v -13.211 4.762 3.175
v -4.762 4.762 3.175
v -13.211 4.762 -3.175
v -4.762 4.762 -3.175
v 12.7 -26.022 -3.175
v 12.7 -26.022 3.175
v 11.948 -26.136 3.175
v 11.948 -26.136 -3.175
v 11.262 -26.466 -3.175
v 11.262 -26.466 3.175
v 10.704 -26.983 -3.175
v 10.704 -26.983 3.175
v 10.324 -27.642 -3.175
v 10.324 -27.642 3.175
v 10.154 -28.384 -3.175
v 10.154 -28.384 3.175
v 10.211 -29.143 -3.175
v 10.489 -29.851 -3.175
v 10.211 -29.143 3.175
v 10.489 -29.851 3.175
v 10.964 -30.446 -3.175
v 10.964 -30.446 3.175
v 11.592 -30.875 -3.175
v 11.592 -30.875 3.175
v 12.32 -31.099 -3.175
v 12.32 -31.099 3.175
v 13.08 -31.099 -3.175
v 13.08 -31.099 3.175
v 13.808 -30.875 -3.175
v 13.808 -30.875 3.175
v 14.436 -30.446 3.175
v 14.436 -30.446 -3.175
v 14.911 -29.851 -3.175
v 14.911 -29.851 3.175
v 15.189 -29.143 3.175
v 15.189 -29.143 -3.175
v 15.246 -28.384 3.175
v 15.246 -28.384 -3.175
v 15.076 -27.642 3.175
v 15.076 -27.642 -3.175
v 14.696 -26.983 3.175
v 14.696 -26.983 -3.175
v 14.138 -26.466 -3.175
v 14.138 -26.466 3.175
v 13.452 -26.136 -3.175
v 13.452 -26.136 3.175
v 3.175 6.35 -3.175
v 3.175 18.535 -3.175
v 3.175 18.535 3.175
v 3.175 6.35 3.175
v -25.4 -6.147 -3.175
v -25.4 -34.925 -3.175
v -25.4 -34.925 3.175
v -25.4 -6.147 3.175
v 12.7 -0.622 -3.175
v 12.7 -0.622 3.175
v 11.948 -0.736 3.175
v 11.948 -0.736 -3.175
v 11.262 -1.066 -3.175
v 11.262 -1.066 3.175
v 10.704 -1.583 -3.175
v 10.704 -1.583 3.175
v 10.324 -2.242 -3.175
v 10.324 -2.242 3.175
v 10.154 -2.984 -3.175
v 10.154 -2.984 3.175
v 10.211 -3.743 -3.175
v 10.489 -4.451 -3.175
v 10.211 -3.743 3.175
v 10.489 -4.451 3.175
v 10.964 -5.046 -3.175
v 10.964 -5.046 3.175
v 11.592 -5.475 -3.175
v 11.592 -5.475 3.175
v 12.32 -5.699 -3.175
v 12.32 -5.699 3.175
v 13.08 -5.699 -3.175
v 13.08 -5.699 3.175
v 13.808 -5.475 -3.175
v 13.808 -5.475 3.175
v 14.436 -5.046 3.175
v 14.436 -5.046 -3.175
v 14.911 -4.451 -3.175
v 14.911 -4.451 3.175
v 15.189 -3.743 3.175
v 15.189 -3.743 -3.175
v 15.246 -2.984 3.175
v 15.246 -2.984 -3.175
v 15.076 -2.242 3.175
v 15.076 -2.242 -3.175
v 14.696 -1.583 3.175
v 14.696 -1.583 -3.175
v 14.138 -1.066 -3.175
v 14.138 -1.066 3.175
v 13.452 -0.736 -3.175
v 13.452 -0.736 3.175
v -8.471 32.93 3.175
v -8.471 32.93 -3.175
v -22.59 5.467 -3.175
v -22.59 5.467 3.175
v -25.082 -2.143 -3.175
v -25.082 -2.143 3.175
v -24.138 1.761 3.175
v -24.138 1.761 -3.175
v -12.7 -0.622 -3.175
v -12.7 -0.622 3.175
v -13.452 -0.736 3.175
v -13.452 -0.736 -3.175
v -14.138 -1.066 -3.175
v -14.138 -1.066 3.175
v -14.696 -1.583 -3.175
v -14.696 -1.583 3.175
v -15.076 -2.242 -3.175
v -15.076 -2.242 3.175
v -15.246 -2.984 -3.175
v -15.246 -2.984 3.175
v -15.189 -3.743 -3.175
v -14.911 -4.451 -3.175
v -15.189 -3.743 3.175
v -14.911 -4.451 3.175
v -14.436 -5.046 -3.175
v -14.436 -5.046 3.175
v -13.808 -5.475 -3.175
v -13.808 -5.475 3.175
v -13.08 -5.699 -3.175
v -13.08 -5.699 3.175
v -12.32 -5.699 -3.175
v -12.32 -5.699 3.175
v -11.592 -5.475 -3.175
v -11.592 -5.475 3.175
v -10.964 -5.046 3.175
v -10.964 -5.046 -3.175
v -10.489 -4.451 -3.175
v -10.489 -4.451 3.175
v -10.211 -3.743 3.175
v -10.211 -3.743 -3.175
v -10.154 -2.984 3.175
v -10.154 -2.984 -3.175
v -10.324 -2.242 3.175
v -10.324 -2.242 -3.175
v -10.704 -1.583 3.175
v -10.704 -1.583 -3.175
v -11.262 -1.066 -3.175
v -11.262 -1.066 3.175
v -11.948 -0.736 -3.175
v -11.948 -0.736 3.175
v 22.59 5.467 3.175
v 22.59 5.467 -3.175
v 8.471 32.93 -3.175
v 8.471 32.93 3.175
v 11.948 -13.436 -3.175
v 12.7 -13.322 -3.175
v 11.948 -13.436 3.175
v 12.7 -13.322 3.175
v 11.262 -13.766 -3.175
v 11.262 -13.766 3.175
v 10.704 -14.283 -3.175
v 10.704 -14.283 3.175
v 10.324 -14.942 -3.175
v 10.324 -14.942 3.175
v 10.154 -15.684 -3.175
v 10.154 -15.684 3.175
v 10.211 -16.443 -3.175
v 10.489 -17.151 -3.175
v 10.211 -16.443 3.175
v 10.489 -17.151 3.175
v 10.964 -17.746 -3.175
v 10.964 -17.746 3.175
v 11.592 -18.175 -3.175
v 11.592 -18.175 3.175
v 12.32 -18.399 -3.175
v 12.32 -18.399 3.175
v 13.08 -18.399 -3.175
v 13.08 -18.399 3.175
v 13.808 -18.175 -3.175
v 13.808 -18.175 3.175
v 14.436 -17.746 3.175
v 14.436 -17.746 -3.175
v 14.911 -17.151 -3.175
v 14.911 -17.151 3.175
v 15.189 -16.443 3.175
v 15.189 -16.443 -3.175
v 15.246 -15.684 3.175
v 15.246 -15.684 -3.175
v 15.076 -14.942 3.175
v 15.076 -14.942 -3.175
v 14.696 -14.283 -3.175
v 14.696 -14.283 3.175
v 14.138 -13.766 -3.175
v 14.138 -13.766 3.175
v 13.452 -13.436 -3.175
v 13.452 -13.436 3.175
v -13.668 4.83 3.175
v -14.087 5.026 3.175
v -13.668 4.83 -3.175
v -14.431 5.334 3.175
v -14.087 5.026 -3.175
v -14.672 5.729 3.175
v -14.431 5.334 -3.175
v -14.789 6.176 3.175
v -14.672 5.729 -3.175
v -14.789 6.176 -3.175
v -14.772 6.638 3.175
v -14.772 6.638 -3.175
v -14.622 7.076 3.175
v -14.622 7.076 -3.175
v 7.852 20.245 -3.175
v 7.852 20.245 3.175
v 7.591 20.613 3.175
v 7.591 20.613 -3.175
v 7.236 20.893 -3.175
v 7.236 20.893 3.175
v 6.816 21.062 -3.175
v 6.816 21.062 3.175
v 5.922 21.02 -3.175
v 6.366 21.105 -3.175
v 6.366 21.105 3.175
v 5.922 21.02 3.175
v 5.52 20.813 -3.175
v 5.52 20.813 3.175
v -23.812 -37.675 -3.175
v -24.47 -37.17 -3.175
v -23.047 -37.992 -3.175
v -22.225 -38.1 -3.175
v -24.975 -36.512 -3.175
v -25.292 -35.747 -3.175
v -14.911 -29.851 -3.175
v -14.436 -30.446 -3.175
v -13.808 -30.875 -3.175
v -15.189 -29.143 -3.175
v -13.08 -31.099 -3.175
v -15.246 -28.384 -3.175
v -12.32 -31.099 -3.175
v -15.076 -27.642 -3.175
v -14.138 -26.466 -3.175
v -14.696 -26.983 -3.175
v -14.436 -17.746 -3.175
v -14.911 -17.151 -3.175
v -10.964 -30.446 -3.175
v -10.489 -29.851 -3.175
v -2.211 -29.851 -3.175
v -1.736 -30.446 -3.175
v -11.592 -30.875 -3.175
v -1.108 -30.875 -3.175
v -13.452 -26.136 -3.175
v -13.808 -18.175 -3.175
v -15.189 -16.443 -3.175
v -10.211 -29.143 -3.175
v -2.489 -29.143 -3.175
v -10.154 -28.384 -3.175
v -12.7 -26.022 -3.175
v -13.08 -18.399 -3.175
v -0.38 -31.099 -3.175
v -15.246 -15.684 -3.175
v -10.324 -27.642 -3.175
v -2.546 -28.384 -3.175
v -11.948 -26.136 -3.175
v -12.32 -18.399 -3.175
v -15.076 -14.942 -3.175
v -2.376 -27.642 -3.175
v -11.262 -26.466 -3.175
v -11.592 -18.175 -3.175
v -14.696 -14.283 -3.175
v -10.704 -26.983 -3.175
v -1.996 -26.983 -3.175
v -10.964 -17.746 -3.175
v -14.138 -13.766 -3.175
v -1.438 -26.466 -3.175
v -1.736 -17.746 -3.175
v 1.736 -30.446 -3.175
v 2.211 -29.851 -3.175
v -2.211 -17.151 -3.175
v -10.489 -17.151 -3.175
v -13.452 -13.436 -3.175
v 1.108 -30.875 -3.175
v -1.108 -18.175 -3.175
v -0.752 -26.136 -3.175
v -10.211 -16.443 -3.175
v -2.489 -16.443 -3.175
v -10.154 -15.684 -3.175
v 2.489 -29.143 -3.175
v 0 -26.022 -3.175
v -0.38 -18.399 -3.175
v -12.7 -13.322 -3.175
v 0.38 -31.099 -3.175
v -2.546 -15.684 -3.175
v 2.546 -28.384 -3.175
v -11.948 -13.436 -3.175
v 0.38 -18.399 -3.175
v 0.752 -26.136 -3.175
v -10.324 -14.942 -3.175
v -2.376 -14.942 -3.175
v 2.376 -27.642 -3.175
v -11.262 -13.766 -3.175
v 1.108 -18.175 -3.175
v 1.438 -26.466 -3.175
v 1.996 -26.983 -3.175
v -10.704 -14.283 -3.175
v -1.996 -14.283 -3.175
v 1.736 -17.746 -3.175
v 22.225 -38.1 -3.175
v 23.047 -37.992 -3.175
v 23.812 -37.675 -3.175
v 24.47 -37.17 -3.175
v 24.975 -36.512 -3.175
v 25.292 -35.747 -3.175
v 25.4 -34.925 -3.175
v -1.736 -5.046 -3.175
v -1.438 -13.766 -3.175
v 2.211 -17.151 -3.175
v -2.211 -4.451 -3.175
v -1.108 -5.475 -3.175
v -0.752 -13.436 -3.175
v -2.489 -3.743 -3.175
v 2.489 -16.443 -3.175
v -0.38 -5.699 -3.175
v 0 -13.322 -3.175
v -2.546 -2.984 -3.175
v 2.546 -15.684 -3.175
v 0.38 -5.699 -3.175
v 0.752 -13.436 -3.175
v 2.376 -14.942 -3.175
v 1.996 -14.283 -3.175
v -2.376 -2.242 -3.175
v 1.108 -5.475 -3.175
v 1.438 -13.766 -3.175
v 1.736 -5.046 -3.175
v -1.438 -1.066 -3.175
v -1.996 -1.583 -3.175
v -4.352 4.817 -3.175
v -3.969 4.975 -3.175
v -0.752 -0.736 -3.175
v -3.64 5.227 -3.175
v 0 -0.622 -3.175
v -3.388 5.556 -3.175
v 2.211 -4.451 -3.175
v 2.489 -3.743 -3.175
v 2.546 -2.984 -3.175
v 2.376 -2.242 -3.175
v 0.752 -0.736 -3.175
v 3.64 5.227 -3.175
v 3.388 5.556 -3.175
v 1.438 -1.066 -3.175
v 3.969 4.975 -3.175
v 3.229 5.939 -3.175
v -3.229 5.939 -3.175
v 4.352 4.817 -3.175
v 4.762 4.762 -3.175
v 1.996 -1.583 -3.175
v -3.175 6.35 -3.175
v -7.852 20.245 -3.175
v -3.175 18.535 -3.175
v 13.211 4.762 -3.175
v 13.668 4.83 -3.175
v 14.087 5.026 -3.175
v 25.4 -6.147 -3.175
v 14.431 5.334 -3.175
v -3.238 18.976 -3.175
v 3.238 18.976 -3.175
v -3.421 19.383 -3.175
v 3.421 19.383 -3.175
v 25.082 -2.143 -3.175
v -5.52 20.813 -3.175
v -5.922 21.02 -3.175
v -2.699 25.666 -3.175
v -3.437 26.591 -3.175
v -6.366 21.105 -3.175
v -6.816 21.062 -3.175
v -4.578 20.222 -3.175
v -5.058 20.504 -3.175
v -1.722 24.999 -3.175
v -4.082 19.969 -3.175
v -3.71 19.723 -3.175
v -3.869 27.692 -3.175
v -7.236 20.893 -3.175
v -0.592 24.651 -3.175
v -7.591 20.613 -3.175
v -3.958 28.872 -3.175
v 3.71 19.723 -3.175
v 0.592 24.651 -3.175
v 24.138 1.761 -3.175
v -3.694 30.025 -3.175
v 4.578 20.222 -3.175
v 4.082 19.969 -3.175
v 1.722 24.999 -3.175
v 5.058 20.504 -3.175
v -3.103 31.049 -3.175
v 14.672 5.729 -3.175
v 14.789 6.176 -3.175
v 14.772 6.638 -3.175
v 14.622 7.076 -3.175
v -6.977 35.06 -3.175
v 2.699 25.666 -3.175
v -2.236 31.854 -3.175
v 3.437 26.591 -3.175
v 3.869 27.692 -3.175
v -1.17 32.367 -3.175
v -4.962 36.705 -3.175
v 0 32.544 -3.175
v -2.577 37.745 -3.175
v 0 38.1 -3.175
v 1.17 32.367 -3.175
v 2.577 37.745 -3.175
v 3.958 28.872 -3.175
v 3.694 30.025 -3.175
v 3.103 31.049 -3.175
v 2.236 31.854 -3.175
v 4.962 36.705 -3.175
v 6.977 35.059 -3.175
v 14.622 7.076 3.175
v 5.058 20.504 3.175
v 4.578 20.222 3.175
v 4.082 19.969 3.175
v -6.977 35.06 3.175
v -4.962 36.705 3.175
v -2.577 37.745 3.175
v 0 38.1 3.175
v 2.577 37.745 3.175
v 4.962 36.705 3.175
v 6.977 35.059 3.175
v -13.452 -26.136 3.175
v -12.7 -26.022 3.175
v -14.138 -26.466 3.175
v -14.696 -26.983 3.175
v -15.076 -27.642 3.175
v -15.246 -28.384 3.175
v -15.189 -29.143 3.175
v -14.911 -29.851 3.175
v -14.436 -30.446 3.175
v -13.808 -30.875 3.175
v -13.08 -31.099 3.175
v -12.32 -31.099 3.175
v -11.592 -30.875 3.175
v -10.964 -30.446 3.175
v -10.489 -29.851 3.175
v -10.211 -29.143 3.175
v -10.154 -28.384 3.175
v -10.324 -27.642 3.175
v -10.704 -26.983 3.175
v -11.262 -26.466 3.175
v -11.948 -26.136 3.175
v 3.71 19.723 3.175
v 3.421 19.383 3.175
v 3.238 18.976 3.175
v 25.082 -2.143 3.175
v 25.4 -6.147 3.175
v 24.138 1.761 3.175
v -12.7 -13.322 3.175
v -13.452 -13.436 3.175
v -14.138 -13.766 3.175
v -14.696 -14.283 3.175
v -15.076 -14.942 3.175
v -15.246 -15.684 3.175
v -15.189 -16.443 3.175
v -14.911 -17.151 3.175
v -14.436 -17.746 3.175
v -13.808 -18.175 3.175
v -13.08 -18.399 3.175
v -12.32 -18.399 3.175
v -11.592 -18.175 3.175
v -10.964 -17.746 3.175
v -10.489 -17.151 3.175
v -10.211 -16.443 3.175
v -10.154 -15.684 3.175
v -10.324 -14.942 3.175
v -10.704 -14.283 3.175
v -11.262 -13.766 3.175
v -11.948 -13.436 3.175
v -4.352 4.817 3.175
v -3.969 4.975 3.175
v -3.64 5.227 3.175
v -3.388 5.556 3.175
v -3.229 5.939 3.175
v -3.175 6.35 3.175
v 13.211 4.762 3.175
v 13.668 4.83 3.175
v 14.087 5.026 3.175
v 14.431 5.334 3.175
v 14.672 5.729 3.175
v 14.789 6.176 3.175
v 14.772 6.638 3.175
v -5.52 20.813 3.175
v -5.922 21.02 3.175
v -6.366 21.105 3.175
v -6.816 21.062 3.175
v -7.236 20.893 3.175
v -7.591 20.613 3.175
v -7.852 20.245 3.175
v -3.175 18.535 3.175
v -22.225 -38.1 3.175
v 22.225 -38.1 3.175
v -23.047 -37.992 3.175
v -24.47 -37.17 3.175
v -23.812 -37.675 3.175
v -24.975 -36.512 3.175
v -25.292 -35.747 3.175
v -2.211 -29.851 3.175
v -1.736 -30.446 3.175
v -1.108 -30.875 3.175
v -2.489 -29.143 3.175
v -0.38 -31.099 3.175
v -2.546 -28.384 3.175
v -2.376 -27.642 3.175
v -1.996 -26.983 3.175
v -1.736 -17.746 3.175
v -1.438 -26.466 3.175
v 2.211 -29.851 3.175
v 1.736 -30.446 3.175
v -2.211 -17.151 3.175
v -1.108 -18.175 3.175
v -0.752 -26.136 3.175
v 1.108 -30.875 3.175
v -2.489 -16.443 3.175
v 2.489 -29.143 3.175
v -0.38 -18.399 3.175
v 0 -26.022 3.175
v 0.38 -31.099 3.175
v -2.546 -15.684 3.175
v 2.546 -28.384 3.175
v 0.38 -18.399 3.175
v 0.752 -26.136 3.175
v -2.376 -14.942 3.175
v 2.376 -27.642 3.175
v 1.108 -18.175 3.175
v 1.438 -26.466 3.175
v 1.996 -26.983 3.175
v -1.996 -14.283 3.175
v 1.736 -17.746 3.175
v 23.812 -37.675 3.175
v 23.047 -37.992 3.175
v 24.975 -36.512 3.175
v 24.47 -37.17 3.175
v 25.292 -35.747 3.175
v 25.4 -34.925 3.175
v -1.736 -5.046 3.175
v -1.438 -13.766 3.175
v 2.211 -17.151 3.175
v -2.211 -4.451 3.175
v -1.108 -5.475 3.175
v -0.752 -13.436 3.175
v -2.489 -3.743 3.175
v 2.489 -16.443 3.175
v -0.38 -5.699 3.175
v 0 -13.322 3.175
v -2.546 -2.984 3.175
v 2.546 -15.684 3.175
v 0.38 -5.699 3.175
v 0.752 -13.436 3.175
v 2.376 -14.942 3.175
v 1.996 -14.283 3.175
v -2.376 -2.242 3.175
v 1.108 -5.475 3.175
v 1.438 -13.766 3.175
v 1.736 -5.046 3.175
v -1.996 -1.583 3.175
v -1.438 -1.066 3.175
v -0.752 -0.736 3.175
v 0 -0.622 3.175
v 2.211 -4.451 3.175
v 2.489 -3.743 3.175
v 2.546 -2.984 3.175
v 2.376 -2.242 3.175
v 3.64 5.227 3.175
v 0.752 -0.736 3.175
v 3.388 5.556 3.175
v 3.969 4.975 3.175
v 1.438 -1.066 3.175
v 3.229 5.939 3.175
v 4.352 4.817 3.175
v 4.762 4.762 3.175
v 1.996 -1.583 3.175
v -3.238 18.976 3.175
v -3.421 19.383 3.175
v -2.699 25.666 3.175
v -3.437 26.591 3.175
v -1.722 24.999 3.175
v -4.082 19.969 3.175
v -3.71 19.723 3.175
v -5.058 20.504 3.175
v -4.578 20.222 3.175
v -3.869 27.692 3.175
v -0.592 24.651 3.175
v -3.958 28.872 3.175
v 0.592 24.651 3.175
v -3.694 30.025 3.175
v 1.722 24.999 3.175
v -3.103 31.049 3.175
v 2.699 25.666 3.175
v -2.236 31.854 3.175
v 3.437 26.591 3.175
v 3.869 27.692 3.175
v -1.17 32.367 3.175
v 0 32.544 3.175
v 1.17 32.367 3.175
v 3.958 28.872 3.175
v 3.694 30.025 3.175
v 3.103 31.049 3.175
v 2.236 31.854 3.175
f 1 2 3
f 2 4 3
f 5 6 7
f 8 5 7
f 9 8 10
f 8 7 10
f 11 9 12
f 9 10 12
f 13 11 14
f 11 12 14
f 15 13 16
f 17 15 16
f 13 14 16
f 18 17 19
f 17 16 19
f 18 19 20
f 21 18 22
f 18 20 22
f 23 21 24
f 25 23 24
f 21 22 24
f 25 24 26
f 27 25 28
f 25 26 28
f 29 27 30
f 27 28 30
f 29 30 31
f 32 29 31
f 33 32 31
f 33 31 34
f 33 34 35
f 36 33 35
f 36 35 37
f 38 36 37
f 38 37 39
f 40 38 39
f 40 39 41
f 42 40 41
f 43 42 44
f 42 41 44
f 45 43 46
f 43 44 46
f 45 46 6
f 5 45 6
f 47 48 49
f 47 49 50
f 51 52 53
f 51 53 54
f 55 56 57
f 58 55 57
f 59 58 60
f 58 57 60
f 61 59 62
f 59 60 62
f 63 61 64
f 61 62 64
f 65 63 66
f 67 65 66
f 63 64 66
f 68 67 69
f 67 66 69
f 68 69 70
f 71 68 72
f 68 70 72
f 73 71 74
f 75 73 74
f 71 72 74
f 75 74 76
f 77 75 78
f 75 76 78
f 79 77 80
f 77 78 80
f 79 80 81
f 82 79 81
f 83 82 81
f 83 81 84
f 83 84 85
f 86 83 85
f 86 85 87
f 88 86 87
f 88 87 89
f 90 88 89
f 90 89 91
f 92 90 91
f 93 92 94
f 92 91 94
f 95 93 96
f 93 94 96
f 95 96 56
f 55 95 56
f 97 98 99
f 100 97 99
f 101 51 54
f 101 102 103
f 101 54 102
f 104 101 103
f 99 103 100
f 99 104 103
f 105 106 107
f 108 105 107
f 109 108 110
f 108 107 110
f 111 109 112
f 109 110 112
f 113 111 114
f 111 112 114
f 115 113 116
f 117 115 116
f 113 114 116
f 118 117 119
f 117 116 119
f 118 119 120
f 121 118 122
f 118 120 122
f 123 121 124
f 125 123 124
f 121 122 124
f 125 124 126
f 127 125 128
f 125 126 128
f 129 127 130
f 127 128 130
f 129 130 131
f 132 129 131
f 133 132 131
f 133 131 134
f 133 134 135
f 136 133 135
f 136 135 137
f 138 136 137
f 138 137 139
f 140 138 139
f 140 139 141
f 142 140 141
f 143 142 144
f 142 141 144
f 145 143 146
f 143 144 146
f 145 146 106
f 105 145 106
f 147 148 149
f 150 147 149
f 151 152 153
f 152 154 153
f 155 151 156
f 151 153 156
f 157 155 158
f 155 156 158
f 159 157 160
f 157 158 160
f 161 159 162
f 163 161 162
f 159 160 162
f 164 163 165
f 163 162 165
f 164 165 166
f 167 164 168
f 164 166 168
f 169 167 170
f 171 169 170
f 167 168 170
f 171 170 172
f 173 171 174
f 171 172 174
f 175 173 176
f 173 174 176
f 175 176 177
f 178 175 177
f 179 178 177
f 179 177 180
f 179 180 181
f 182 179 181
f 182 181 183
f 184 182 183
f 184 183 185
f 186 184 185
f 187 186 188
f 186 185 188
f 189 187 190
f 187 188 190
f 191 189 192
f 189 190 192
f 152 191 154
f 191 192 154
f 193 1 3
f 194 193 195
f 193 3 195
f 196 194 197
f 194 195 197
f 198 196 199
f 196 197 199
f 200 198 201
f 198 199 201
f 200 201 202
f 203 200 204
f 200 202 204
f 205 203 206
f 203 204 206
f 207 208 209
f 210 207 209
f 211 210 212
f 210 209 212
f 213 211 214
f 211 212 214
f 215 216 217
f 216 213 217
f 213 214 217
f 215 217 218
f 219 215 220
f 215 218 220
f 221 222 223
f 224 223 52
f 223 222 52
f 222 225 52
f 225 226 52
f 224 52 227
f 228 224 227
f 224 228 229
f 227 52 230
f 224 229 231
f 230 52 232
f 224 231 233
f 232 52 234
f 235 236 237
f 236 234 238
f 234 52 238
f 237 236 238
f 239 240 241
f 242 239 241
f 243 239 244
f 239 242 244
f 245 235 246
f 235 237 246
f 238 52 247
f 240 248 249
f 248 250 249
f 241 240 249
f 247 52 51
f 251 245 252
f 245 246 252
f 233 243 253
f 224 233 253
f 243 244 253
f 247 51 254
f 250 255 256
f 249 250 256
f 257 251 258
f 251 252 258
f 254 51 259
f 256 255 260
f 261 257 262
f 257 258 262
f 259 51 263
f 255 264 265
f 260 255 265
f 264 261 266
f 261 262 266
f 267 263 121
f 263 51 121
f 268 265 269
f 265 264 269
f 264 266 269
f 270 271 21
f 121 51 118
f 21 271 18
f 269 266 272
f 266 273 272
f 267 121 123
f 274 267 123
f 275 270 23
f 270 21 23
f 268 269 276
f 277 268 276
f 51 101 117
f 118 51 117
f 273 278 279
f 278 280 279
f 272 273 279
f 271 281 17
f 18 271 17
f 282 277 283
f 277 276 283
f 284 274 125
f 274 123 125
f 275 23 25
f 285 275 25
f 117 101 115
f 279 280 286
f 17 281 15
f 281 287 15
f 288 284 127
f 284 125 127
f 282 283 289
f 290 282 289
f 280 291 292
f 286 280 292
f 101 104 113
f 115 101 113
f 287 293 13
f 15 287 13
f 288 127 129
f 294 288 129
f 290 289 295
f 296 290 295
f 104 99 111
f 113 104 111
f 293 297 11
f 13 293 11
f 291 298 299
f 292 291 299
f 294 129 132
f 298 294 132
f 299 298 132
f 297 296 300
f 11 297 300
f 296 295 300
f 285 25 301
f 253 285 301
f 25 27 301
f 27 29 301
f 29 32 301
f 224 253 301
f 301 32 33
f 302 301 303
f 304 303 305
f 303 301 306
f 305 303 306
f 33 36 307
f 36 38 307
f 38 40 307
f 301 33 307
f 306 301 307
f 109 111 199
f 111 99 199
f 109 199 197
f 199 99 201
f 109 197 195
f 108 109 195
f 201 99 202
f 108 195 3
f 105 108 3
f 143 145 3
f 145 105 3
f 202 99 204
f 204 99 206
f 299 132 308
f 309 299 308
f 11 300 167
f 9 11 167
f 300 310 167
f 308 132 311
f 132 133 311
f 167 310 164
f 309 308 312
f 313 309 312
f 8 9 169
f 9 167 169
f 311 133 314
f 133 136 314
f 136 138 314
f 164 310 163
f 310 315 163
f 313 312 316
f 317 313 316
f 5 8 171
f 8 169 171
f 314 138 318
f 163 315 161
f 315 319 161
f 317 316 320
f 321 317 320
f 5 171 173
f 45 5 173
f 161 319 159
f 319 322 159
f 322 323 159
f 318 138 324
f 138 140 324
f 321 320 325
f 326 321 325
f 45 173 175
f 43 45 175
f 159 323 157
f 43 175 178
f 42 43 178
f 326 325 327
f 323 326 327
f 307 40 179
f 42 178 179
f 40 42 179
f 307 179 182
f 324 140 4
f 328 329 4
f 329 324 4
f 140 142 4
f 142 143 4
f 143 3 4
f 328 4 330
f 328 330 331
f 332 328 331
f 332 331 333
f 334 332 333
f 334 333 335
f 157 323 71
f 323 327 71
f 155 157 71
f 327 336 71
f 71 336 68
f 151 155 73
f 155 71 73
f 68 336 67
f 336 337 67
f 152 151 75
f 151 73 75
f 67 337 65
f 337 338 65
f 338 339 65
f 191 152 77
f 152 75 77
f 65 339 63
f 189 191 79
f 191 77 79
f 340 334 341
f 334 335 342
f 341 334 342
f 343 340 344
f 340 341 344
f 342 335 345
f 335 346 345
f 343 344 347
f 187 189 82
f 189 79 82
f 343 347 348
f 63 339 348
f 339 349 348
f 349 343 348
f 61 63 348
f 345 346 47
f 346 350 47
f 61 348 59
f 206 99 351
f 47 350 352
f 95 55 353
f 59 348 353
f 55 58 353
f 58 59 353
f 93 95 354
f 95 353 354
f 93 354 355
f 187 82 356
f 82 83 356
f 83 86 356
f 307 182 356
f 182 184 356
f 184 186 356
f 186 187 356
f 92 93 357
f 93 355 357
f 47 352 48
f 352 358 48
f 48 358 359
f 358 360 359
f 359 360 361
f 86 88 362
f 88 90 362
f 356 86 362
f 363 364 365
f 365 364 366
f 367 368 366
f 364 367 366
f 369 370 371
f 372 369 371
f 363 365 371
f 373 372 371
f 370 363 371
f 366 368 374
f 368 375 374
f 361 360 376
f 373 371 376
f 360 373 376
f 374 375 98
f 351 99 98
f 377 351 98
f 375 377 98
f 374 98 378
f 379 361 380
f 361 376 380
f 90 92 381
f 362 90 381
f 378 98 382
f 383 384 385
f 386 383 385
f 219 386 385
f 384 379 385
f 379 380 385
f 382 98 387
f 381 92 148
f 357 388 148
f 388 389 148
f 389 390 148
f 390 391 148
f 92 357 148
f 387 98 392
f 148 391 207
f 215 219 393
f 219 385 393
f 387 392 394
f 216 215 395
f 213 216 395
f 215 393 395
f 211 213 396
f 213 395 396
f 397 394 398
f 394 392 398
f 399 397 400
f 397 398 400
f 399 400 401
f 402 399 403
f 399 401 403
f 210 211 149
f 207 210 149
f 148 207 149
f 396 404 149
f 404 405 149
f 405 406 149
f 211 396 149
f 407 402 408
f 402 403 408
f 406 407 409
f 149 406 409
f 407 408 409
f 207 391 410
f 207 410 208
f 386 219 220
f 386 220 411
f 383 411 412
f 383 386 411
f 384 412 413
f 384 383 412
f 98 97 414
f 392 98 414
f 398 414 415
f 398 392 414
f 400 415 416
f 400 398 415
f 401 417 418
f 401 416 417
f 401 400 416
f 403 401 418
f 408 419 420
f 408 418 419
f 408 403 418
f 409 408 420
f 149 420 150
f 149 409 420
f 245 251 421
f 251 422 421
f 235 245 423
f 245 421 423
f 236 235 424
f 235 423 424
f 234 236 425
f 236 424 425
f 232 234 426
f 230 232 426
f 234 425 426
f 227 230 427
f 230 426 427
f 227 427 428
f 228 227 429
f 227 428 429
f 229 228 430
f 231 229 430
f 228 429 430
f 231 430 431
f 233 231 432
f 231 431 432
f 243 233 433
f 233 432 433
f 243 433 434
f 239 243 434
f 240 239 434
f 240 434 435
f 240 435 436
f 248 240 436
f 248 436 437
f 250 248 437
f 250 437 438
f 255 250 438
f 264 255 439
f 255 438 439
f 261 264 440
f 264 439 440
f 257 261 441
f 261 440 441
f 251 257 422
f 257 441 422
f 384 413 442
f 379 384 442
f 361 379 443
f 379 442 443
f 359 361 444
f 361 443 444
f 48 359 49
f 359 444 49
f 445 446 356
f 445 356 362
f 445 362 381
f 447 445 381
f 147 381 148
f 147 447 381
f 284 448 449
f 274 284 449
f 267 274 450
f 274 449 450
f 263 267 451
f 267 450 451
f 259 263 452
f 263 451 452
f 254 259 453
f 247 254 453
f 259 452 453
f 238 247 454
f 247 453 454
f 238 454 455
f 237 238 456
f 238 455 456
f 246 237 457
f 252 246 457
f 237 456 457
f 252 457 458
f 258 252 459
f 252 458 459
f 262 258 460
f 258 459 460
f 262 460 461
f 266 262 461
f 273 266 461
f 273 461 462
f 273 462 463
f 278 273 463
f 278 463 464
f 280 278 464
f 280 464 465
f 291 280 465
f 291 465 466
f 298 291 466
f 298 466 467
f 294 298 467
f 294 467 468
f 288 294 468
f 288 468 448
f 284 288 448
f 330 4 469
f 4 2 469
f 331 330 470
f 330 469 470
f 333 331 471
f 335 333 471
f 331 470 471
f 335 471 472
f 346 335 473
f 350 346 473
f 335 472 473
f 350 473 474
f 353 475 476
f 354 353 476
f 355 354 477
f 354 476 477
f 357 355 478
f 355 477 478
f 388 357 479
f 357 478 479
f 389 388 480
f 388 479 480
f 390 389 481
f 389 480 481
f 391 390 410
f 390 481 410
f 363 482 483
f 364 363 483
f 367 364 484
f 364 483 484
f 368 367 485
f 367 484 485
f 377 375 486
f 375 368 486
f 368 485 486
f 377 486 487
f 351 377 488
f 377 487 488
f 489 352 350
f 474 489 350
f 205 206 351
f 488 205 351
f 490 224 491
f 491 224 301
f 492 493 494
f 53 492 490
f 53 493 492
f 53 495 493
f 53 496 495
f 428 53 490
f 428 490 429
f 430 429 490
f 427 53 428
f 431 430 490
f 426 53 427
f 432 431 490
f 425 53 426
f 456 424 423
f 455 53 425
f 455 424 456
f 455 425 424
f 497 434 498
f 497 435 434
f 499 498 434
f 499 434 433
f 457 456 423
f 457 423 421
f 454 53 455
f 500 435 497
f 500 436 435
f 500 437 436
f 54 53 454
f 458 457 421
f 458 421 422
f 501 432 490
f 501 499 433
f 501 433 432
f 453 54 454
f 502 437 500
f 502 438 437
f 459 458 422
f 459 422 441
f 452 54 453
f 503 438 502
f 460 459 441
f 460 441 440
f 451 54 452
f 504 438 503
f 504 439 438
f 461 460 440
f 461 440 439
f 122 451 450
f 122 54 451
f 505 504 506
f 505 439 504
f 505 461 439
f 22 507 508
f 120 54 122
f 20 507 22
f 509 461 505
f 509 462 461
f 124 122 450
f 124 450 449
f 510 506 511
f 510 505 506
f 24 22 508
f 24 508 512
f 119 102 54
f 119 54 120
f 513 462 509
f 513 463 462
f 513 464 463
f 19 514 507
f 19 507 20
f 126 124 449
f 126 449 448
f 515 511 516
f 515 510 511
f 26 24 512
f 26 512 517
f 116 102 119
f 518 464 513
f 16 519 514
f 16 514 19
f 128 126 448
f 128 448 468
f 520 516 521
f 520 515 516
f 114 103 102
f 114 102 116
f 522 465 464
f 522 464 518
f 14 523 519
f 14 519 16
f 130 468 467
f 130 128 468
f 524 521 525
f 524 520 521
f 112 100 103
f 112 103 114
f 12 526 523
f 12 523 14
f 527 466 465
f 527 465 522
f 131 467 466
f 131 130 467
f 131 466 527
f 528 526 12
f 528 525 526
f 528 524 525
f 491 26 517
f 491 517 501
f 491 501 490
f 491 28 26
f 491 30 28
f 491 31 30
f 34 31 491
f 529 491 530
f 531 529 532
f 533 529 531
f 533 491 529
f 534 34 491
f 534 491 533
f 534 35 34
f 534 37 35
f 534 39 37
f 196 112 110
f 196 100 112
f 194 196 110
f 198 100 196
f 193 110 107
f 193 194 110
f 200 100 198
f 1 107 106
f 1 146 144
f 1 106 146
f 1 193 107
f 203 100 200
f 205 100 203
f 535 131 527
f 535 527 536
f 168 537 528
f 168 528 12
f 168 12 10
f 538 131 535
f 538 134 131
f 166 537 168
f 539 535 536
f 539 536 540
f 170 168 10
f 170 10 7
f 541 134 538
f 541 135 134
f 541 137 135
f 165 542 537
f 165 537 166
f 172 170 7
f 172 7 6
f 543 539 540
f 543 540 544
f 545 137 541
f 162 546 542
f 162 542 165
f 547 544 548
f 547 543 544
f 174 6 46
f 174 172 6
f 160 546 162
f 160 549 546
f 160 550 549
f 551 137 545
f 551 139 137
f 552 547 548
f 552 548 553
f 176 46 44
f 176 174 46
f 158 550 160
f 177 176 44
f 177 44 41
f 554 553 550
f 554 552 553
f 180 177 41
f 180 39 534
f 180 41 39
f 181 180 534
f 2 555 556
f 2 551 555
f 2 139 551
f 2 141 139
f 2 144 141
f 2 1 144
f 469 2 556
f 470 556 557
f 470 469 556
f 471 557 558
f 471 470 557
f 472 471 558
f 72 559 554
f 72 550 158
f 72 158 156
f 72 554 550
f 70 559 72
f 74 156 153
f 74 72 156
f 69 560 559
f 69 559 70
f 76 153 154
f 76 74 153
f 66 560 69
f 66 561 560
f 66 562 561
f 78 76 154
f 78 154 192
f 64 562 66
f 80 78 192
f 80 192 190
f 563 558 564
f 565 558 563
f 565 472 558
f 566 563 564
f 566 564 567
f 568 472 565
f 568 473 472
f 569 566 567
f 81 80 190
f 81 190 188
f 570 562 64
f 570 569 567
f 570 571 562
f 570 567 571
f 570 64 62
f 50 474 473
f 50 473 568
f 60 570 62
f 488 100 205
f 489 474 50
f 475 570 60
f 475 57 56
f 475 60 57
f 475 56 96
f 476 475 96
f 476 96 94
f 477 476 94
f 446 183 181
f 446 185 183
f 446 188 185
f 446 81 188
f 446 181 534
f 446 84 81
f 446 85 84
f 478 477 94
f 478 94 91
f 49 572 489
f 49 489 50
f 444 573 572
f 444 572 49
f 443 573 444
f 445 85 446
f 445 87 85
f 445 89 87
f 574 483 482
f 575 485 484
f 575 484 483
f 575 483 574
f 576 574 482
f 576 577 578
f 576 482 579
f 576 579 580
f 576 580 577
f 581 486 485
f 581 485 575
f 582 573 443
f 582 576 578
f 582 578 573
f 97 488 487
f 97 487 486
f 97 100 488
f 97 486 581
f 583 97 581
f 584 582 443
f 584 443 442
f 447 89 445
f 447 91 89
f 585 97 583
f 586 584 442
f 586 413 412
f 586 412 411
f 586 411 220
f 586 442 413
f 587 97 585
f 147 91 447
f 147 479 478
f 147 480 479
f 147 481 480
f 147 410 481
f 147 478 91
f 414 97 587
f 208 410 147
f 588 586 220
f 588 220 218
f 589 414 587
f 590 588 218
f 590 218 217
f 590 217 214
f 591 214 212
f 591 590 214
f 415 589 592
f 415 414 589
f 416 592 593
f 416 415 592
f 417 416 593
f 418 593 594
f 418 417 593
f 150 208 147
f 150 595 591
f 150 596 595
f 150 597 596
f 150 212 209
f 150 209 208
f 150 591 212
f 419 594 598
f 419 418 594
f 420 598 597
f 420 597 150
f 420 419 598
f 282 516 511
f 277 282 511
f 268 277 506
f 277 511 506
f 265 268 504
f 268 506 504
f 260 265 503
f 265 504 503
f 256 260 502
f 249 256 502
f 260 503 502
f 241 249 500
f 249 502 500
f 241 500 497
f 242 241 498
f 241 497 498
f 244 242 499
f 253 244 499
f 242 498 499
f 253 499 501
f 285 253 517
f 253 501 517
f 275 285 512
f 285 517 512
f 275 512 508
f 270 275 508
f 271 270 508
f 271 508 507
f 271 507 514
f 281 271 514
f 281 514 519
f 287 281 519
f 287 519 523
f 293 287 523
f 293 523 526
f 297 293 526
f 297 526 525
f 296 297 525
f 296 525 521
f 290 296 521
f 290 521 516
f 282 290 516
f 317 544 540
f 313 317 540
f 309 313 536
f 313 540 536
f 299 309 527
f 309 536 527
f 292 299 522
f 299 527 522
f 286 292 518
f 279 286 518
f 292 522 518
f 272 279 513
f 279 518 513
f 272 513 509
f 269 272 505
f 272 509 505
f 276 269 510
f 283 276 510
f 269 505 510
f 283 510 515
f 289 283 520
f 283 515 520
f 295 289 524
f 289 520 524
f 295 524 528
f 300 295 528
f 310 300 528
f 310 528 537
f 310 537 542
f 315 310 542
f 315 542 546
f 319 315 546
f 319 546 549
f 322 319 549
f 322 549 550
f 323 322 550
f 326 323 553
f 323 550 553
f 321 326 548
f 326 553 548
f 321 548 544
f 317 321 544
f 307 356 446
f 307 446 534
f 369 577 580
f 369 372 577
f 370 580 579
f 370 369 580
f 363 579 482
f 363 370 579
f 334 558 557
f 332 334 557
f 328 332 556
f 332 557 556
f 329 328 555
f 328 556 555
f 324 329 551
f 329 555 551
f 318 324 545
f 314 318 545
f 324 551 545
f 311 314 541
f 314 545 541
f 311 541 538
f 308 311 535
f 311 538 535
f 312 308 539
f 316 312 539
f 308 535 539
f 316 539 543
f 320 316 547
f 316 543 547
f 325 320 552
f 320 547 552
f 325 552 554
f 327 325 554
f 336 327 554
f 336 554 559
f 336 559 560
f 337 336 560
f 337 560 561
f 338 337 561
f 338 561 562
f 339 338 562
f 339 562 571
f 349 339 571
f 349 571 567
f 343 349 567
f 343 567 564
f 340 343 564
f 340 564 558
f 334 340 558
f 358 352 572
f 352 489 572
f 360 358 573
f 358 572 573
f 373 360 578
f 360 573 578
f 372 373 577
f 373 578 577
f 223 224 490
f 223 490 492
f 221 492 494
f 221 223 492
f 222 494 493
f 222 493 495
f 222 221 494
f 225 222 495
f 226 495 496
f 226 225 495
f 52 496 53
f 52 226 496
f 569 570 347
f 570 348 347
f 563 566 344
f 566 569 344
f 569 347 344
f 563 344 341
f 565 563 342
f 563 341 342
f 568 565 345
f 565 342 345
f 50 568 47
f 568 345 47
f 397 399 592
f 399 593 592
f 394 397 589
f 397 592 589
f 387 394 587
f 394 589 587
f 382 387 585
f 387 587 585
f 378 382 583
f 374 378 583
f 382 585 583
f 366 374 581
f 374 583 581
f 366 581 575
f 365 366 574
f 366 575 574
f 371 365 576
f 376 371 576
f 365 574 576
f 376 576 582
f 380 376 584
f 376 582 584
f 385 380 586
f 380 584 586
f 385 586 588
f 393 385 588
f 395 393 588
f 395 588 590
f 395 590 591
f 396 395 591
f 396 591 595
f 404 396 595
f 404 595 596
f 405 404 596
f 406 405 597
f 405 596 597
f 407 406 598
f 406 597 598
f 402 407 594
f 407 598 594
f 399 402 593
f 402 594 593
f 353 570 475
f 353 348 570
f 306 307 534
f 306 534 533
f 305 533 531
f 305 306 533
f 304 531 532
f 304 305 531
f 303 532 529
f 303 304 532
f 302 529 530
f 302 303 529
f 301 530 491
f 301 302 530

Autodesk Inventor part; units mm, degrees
ref_plane "YZ Plane" through (0, 0, 0) normal (1, 0, 0) x (0, 1, 0)
ref_plane "XZ Plane" through (0, 0, 0) normal (0, 1, 0) x (-1, 0, 0)
ref_plane "XY Plane" through (0, 0, 0) normal (0, 0, 1) x (1, 0, 0)
sketch "Sketch1" plane through (0, 0, 0) normal (0, 0, 1) x (1, 0, 0)
  line L0 (25.4, 0) -> (-25.4, 0) construction
  line L1 (25.4, 0) -> (25.4, -38.1)
  line L2 (-25.4, -38.1) -> (-25.4, 0)
  line L3 (0, 57.7256) -> (0, -54.0709) construction
  line L4 (-25.4, -38.1) -> (25.4, -38.1)
  line L5 (25.4, 0) -> (8.4711, 32.9299)
  arc A0 (6.9296, 22.04) -> (3.175, 19.5947) centre (0, 28.575) ccw
  line L6 (-8.4711, 32.9299) -> (-25.4, 0)
  line L7 (15.8117, 4.7625) -> (6.9296, 22.04)
  line L8 (3.175, 19.5947) -> (3.175, 4.7625)
  line L9 (3.175, 4.7625) -> (15.8117, 4.7625)
  arc A1 (3.175, 19.5947) -> (6.9296, 22.04) centre (0, 28.575) ccw
  line L10 (-15.8117, 4.7625) -> (-6.9296, 22.04)
  line L11 (-3.175, 19.5947) -> (-3.175, 4.7625)
  line L12 (-3.175, 4.7625) -> (-15.8117, 4.7625)
  arc A2 (-6.9296, 22.04) -> (-3.175, 19.5947) centre (0, 28.575) ccw
  point P0 (0, 0)
  point P1 (0, 0)
  point P2 (-3.175, 19.5947)
  point P3 (-6.9296, 22.04)
  dimension "d112" = 28.575
  dimension "d113" = 9.525
  dimension "d114" = 50.8
  dimension "d115" = 38.1
  dimension "d117" = 6.35
  dimension "d118" = 4.7625
  dimension "d119" = 6.35
extrude "Extrusion2" add sketch "Sketch1" along normal mid plane 6.35 contours L1 L4 L2 L6 A0 L10 L12 L11 L8 L9 L7 L5 | A0 A1
sketch "Sketch3" plane through (0, 0, -3.175) normal (0, 0, -1) x (-1, 0, 0)
  line L0 (-35.56, 0) -> (35.56, 0) construction
  line L1 (0, -53.34) -> (0, 53.34) construction
  line L2 (12.7, -3.175) -> (-12.7, -3.175) construction
  line L3 (12.7, -15.875) -> (-12.7, -15.875) construction
  line L4 (12.7, -28.575) -> (-12.7, -28.575) construction
  point P0 (0, 0)
  point P1 (0, -3.175)
  point P2 (0, -15.875)
  point P3 (0, -28.575)
  dimension "d43" = 25.4
  dimension "d45" = 3.175
  dimension "d107" = 12.7
hole "Hole2" at (12.7, -3.175, -3.175) at (-12.7, -3.175, -3.175) at (0, -3.175, -3.175) at (12.7, -15.875, -3.175) at (0, -15.875, -3.175) at (-12.7, -15.875, -3.175) at (12.7, -28.575, -3.175) at (0, -28.575, -3.175) at (-12.7, -28.575, -3.175) direction (0, 0, 1) diameter 5.1054 end through all clearance for "Flat Head Machine Screw (82)" size "#10" standard "Ansi Unified Screw Threads"
sketch "Sketch7" plane through (0, 0, -3.175) normal (0, 0, 1) x (1, 0, 0)
  arc A0 (8.4711, 32.9299) -> (-8.4711, 32.9299) centre (0, 28.575) ccw construction
  point P0 (0, 0)
hole "Hole4" at (0, 28.575, -3.175) direction (0, 0, 1) diameter 7.9375 end through all
fillet "Fillet5" radius 3.175 2 edges at (-25.4, -38.1, 0) (25.4, -38.1, 0)
fillet "Fillet7" radius 1.5875 8 edges at (-15.8117, 4.7625, 0) (-6.9296, 22.04, 0) (-3.175, 19.5947, 0) (-3.175, 4.7625, 0) (3.175, 4.7625, 0) (3.175, 19.5947, 0) (6.9296, 22.04, 0) (15.8117, 4.7625, 0)
fillet "Fillet9" radius 25.4 2 edges at (25.4, 0, 0) (-25.4, 0, 0)
equation "\"BendRadius\" = Thickness"
equation "\"BendReliefWidth\" = Thickness"
equation "\"BendReliefDepth\" = 0.5 * Thickness"
equation "\"CornerReliefSize\" = 4 * Thickness"
equation "\"MinimumRemnant\" = 2 * Thickness"
equation "\"TransitionRadius\" = BendRadius"
equation "\"JacobiRadiusSize\" = BendRadius"
equation "\"GapSize\" = Thickness"
equation "\"Thickness\" = 6.35"
properties part number "PLATE,SIDE,PULLEY,MOUNT,TOP,ELEVATORR" material "Aluminum 7075"
